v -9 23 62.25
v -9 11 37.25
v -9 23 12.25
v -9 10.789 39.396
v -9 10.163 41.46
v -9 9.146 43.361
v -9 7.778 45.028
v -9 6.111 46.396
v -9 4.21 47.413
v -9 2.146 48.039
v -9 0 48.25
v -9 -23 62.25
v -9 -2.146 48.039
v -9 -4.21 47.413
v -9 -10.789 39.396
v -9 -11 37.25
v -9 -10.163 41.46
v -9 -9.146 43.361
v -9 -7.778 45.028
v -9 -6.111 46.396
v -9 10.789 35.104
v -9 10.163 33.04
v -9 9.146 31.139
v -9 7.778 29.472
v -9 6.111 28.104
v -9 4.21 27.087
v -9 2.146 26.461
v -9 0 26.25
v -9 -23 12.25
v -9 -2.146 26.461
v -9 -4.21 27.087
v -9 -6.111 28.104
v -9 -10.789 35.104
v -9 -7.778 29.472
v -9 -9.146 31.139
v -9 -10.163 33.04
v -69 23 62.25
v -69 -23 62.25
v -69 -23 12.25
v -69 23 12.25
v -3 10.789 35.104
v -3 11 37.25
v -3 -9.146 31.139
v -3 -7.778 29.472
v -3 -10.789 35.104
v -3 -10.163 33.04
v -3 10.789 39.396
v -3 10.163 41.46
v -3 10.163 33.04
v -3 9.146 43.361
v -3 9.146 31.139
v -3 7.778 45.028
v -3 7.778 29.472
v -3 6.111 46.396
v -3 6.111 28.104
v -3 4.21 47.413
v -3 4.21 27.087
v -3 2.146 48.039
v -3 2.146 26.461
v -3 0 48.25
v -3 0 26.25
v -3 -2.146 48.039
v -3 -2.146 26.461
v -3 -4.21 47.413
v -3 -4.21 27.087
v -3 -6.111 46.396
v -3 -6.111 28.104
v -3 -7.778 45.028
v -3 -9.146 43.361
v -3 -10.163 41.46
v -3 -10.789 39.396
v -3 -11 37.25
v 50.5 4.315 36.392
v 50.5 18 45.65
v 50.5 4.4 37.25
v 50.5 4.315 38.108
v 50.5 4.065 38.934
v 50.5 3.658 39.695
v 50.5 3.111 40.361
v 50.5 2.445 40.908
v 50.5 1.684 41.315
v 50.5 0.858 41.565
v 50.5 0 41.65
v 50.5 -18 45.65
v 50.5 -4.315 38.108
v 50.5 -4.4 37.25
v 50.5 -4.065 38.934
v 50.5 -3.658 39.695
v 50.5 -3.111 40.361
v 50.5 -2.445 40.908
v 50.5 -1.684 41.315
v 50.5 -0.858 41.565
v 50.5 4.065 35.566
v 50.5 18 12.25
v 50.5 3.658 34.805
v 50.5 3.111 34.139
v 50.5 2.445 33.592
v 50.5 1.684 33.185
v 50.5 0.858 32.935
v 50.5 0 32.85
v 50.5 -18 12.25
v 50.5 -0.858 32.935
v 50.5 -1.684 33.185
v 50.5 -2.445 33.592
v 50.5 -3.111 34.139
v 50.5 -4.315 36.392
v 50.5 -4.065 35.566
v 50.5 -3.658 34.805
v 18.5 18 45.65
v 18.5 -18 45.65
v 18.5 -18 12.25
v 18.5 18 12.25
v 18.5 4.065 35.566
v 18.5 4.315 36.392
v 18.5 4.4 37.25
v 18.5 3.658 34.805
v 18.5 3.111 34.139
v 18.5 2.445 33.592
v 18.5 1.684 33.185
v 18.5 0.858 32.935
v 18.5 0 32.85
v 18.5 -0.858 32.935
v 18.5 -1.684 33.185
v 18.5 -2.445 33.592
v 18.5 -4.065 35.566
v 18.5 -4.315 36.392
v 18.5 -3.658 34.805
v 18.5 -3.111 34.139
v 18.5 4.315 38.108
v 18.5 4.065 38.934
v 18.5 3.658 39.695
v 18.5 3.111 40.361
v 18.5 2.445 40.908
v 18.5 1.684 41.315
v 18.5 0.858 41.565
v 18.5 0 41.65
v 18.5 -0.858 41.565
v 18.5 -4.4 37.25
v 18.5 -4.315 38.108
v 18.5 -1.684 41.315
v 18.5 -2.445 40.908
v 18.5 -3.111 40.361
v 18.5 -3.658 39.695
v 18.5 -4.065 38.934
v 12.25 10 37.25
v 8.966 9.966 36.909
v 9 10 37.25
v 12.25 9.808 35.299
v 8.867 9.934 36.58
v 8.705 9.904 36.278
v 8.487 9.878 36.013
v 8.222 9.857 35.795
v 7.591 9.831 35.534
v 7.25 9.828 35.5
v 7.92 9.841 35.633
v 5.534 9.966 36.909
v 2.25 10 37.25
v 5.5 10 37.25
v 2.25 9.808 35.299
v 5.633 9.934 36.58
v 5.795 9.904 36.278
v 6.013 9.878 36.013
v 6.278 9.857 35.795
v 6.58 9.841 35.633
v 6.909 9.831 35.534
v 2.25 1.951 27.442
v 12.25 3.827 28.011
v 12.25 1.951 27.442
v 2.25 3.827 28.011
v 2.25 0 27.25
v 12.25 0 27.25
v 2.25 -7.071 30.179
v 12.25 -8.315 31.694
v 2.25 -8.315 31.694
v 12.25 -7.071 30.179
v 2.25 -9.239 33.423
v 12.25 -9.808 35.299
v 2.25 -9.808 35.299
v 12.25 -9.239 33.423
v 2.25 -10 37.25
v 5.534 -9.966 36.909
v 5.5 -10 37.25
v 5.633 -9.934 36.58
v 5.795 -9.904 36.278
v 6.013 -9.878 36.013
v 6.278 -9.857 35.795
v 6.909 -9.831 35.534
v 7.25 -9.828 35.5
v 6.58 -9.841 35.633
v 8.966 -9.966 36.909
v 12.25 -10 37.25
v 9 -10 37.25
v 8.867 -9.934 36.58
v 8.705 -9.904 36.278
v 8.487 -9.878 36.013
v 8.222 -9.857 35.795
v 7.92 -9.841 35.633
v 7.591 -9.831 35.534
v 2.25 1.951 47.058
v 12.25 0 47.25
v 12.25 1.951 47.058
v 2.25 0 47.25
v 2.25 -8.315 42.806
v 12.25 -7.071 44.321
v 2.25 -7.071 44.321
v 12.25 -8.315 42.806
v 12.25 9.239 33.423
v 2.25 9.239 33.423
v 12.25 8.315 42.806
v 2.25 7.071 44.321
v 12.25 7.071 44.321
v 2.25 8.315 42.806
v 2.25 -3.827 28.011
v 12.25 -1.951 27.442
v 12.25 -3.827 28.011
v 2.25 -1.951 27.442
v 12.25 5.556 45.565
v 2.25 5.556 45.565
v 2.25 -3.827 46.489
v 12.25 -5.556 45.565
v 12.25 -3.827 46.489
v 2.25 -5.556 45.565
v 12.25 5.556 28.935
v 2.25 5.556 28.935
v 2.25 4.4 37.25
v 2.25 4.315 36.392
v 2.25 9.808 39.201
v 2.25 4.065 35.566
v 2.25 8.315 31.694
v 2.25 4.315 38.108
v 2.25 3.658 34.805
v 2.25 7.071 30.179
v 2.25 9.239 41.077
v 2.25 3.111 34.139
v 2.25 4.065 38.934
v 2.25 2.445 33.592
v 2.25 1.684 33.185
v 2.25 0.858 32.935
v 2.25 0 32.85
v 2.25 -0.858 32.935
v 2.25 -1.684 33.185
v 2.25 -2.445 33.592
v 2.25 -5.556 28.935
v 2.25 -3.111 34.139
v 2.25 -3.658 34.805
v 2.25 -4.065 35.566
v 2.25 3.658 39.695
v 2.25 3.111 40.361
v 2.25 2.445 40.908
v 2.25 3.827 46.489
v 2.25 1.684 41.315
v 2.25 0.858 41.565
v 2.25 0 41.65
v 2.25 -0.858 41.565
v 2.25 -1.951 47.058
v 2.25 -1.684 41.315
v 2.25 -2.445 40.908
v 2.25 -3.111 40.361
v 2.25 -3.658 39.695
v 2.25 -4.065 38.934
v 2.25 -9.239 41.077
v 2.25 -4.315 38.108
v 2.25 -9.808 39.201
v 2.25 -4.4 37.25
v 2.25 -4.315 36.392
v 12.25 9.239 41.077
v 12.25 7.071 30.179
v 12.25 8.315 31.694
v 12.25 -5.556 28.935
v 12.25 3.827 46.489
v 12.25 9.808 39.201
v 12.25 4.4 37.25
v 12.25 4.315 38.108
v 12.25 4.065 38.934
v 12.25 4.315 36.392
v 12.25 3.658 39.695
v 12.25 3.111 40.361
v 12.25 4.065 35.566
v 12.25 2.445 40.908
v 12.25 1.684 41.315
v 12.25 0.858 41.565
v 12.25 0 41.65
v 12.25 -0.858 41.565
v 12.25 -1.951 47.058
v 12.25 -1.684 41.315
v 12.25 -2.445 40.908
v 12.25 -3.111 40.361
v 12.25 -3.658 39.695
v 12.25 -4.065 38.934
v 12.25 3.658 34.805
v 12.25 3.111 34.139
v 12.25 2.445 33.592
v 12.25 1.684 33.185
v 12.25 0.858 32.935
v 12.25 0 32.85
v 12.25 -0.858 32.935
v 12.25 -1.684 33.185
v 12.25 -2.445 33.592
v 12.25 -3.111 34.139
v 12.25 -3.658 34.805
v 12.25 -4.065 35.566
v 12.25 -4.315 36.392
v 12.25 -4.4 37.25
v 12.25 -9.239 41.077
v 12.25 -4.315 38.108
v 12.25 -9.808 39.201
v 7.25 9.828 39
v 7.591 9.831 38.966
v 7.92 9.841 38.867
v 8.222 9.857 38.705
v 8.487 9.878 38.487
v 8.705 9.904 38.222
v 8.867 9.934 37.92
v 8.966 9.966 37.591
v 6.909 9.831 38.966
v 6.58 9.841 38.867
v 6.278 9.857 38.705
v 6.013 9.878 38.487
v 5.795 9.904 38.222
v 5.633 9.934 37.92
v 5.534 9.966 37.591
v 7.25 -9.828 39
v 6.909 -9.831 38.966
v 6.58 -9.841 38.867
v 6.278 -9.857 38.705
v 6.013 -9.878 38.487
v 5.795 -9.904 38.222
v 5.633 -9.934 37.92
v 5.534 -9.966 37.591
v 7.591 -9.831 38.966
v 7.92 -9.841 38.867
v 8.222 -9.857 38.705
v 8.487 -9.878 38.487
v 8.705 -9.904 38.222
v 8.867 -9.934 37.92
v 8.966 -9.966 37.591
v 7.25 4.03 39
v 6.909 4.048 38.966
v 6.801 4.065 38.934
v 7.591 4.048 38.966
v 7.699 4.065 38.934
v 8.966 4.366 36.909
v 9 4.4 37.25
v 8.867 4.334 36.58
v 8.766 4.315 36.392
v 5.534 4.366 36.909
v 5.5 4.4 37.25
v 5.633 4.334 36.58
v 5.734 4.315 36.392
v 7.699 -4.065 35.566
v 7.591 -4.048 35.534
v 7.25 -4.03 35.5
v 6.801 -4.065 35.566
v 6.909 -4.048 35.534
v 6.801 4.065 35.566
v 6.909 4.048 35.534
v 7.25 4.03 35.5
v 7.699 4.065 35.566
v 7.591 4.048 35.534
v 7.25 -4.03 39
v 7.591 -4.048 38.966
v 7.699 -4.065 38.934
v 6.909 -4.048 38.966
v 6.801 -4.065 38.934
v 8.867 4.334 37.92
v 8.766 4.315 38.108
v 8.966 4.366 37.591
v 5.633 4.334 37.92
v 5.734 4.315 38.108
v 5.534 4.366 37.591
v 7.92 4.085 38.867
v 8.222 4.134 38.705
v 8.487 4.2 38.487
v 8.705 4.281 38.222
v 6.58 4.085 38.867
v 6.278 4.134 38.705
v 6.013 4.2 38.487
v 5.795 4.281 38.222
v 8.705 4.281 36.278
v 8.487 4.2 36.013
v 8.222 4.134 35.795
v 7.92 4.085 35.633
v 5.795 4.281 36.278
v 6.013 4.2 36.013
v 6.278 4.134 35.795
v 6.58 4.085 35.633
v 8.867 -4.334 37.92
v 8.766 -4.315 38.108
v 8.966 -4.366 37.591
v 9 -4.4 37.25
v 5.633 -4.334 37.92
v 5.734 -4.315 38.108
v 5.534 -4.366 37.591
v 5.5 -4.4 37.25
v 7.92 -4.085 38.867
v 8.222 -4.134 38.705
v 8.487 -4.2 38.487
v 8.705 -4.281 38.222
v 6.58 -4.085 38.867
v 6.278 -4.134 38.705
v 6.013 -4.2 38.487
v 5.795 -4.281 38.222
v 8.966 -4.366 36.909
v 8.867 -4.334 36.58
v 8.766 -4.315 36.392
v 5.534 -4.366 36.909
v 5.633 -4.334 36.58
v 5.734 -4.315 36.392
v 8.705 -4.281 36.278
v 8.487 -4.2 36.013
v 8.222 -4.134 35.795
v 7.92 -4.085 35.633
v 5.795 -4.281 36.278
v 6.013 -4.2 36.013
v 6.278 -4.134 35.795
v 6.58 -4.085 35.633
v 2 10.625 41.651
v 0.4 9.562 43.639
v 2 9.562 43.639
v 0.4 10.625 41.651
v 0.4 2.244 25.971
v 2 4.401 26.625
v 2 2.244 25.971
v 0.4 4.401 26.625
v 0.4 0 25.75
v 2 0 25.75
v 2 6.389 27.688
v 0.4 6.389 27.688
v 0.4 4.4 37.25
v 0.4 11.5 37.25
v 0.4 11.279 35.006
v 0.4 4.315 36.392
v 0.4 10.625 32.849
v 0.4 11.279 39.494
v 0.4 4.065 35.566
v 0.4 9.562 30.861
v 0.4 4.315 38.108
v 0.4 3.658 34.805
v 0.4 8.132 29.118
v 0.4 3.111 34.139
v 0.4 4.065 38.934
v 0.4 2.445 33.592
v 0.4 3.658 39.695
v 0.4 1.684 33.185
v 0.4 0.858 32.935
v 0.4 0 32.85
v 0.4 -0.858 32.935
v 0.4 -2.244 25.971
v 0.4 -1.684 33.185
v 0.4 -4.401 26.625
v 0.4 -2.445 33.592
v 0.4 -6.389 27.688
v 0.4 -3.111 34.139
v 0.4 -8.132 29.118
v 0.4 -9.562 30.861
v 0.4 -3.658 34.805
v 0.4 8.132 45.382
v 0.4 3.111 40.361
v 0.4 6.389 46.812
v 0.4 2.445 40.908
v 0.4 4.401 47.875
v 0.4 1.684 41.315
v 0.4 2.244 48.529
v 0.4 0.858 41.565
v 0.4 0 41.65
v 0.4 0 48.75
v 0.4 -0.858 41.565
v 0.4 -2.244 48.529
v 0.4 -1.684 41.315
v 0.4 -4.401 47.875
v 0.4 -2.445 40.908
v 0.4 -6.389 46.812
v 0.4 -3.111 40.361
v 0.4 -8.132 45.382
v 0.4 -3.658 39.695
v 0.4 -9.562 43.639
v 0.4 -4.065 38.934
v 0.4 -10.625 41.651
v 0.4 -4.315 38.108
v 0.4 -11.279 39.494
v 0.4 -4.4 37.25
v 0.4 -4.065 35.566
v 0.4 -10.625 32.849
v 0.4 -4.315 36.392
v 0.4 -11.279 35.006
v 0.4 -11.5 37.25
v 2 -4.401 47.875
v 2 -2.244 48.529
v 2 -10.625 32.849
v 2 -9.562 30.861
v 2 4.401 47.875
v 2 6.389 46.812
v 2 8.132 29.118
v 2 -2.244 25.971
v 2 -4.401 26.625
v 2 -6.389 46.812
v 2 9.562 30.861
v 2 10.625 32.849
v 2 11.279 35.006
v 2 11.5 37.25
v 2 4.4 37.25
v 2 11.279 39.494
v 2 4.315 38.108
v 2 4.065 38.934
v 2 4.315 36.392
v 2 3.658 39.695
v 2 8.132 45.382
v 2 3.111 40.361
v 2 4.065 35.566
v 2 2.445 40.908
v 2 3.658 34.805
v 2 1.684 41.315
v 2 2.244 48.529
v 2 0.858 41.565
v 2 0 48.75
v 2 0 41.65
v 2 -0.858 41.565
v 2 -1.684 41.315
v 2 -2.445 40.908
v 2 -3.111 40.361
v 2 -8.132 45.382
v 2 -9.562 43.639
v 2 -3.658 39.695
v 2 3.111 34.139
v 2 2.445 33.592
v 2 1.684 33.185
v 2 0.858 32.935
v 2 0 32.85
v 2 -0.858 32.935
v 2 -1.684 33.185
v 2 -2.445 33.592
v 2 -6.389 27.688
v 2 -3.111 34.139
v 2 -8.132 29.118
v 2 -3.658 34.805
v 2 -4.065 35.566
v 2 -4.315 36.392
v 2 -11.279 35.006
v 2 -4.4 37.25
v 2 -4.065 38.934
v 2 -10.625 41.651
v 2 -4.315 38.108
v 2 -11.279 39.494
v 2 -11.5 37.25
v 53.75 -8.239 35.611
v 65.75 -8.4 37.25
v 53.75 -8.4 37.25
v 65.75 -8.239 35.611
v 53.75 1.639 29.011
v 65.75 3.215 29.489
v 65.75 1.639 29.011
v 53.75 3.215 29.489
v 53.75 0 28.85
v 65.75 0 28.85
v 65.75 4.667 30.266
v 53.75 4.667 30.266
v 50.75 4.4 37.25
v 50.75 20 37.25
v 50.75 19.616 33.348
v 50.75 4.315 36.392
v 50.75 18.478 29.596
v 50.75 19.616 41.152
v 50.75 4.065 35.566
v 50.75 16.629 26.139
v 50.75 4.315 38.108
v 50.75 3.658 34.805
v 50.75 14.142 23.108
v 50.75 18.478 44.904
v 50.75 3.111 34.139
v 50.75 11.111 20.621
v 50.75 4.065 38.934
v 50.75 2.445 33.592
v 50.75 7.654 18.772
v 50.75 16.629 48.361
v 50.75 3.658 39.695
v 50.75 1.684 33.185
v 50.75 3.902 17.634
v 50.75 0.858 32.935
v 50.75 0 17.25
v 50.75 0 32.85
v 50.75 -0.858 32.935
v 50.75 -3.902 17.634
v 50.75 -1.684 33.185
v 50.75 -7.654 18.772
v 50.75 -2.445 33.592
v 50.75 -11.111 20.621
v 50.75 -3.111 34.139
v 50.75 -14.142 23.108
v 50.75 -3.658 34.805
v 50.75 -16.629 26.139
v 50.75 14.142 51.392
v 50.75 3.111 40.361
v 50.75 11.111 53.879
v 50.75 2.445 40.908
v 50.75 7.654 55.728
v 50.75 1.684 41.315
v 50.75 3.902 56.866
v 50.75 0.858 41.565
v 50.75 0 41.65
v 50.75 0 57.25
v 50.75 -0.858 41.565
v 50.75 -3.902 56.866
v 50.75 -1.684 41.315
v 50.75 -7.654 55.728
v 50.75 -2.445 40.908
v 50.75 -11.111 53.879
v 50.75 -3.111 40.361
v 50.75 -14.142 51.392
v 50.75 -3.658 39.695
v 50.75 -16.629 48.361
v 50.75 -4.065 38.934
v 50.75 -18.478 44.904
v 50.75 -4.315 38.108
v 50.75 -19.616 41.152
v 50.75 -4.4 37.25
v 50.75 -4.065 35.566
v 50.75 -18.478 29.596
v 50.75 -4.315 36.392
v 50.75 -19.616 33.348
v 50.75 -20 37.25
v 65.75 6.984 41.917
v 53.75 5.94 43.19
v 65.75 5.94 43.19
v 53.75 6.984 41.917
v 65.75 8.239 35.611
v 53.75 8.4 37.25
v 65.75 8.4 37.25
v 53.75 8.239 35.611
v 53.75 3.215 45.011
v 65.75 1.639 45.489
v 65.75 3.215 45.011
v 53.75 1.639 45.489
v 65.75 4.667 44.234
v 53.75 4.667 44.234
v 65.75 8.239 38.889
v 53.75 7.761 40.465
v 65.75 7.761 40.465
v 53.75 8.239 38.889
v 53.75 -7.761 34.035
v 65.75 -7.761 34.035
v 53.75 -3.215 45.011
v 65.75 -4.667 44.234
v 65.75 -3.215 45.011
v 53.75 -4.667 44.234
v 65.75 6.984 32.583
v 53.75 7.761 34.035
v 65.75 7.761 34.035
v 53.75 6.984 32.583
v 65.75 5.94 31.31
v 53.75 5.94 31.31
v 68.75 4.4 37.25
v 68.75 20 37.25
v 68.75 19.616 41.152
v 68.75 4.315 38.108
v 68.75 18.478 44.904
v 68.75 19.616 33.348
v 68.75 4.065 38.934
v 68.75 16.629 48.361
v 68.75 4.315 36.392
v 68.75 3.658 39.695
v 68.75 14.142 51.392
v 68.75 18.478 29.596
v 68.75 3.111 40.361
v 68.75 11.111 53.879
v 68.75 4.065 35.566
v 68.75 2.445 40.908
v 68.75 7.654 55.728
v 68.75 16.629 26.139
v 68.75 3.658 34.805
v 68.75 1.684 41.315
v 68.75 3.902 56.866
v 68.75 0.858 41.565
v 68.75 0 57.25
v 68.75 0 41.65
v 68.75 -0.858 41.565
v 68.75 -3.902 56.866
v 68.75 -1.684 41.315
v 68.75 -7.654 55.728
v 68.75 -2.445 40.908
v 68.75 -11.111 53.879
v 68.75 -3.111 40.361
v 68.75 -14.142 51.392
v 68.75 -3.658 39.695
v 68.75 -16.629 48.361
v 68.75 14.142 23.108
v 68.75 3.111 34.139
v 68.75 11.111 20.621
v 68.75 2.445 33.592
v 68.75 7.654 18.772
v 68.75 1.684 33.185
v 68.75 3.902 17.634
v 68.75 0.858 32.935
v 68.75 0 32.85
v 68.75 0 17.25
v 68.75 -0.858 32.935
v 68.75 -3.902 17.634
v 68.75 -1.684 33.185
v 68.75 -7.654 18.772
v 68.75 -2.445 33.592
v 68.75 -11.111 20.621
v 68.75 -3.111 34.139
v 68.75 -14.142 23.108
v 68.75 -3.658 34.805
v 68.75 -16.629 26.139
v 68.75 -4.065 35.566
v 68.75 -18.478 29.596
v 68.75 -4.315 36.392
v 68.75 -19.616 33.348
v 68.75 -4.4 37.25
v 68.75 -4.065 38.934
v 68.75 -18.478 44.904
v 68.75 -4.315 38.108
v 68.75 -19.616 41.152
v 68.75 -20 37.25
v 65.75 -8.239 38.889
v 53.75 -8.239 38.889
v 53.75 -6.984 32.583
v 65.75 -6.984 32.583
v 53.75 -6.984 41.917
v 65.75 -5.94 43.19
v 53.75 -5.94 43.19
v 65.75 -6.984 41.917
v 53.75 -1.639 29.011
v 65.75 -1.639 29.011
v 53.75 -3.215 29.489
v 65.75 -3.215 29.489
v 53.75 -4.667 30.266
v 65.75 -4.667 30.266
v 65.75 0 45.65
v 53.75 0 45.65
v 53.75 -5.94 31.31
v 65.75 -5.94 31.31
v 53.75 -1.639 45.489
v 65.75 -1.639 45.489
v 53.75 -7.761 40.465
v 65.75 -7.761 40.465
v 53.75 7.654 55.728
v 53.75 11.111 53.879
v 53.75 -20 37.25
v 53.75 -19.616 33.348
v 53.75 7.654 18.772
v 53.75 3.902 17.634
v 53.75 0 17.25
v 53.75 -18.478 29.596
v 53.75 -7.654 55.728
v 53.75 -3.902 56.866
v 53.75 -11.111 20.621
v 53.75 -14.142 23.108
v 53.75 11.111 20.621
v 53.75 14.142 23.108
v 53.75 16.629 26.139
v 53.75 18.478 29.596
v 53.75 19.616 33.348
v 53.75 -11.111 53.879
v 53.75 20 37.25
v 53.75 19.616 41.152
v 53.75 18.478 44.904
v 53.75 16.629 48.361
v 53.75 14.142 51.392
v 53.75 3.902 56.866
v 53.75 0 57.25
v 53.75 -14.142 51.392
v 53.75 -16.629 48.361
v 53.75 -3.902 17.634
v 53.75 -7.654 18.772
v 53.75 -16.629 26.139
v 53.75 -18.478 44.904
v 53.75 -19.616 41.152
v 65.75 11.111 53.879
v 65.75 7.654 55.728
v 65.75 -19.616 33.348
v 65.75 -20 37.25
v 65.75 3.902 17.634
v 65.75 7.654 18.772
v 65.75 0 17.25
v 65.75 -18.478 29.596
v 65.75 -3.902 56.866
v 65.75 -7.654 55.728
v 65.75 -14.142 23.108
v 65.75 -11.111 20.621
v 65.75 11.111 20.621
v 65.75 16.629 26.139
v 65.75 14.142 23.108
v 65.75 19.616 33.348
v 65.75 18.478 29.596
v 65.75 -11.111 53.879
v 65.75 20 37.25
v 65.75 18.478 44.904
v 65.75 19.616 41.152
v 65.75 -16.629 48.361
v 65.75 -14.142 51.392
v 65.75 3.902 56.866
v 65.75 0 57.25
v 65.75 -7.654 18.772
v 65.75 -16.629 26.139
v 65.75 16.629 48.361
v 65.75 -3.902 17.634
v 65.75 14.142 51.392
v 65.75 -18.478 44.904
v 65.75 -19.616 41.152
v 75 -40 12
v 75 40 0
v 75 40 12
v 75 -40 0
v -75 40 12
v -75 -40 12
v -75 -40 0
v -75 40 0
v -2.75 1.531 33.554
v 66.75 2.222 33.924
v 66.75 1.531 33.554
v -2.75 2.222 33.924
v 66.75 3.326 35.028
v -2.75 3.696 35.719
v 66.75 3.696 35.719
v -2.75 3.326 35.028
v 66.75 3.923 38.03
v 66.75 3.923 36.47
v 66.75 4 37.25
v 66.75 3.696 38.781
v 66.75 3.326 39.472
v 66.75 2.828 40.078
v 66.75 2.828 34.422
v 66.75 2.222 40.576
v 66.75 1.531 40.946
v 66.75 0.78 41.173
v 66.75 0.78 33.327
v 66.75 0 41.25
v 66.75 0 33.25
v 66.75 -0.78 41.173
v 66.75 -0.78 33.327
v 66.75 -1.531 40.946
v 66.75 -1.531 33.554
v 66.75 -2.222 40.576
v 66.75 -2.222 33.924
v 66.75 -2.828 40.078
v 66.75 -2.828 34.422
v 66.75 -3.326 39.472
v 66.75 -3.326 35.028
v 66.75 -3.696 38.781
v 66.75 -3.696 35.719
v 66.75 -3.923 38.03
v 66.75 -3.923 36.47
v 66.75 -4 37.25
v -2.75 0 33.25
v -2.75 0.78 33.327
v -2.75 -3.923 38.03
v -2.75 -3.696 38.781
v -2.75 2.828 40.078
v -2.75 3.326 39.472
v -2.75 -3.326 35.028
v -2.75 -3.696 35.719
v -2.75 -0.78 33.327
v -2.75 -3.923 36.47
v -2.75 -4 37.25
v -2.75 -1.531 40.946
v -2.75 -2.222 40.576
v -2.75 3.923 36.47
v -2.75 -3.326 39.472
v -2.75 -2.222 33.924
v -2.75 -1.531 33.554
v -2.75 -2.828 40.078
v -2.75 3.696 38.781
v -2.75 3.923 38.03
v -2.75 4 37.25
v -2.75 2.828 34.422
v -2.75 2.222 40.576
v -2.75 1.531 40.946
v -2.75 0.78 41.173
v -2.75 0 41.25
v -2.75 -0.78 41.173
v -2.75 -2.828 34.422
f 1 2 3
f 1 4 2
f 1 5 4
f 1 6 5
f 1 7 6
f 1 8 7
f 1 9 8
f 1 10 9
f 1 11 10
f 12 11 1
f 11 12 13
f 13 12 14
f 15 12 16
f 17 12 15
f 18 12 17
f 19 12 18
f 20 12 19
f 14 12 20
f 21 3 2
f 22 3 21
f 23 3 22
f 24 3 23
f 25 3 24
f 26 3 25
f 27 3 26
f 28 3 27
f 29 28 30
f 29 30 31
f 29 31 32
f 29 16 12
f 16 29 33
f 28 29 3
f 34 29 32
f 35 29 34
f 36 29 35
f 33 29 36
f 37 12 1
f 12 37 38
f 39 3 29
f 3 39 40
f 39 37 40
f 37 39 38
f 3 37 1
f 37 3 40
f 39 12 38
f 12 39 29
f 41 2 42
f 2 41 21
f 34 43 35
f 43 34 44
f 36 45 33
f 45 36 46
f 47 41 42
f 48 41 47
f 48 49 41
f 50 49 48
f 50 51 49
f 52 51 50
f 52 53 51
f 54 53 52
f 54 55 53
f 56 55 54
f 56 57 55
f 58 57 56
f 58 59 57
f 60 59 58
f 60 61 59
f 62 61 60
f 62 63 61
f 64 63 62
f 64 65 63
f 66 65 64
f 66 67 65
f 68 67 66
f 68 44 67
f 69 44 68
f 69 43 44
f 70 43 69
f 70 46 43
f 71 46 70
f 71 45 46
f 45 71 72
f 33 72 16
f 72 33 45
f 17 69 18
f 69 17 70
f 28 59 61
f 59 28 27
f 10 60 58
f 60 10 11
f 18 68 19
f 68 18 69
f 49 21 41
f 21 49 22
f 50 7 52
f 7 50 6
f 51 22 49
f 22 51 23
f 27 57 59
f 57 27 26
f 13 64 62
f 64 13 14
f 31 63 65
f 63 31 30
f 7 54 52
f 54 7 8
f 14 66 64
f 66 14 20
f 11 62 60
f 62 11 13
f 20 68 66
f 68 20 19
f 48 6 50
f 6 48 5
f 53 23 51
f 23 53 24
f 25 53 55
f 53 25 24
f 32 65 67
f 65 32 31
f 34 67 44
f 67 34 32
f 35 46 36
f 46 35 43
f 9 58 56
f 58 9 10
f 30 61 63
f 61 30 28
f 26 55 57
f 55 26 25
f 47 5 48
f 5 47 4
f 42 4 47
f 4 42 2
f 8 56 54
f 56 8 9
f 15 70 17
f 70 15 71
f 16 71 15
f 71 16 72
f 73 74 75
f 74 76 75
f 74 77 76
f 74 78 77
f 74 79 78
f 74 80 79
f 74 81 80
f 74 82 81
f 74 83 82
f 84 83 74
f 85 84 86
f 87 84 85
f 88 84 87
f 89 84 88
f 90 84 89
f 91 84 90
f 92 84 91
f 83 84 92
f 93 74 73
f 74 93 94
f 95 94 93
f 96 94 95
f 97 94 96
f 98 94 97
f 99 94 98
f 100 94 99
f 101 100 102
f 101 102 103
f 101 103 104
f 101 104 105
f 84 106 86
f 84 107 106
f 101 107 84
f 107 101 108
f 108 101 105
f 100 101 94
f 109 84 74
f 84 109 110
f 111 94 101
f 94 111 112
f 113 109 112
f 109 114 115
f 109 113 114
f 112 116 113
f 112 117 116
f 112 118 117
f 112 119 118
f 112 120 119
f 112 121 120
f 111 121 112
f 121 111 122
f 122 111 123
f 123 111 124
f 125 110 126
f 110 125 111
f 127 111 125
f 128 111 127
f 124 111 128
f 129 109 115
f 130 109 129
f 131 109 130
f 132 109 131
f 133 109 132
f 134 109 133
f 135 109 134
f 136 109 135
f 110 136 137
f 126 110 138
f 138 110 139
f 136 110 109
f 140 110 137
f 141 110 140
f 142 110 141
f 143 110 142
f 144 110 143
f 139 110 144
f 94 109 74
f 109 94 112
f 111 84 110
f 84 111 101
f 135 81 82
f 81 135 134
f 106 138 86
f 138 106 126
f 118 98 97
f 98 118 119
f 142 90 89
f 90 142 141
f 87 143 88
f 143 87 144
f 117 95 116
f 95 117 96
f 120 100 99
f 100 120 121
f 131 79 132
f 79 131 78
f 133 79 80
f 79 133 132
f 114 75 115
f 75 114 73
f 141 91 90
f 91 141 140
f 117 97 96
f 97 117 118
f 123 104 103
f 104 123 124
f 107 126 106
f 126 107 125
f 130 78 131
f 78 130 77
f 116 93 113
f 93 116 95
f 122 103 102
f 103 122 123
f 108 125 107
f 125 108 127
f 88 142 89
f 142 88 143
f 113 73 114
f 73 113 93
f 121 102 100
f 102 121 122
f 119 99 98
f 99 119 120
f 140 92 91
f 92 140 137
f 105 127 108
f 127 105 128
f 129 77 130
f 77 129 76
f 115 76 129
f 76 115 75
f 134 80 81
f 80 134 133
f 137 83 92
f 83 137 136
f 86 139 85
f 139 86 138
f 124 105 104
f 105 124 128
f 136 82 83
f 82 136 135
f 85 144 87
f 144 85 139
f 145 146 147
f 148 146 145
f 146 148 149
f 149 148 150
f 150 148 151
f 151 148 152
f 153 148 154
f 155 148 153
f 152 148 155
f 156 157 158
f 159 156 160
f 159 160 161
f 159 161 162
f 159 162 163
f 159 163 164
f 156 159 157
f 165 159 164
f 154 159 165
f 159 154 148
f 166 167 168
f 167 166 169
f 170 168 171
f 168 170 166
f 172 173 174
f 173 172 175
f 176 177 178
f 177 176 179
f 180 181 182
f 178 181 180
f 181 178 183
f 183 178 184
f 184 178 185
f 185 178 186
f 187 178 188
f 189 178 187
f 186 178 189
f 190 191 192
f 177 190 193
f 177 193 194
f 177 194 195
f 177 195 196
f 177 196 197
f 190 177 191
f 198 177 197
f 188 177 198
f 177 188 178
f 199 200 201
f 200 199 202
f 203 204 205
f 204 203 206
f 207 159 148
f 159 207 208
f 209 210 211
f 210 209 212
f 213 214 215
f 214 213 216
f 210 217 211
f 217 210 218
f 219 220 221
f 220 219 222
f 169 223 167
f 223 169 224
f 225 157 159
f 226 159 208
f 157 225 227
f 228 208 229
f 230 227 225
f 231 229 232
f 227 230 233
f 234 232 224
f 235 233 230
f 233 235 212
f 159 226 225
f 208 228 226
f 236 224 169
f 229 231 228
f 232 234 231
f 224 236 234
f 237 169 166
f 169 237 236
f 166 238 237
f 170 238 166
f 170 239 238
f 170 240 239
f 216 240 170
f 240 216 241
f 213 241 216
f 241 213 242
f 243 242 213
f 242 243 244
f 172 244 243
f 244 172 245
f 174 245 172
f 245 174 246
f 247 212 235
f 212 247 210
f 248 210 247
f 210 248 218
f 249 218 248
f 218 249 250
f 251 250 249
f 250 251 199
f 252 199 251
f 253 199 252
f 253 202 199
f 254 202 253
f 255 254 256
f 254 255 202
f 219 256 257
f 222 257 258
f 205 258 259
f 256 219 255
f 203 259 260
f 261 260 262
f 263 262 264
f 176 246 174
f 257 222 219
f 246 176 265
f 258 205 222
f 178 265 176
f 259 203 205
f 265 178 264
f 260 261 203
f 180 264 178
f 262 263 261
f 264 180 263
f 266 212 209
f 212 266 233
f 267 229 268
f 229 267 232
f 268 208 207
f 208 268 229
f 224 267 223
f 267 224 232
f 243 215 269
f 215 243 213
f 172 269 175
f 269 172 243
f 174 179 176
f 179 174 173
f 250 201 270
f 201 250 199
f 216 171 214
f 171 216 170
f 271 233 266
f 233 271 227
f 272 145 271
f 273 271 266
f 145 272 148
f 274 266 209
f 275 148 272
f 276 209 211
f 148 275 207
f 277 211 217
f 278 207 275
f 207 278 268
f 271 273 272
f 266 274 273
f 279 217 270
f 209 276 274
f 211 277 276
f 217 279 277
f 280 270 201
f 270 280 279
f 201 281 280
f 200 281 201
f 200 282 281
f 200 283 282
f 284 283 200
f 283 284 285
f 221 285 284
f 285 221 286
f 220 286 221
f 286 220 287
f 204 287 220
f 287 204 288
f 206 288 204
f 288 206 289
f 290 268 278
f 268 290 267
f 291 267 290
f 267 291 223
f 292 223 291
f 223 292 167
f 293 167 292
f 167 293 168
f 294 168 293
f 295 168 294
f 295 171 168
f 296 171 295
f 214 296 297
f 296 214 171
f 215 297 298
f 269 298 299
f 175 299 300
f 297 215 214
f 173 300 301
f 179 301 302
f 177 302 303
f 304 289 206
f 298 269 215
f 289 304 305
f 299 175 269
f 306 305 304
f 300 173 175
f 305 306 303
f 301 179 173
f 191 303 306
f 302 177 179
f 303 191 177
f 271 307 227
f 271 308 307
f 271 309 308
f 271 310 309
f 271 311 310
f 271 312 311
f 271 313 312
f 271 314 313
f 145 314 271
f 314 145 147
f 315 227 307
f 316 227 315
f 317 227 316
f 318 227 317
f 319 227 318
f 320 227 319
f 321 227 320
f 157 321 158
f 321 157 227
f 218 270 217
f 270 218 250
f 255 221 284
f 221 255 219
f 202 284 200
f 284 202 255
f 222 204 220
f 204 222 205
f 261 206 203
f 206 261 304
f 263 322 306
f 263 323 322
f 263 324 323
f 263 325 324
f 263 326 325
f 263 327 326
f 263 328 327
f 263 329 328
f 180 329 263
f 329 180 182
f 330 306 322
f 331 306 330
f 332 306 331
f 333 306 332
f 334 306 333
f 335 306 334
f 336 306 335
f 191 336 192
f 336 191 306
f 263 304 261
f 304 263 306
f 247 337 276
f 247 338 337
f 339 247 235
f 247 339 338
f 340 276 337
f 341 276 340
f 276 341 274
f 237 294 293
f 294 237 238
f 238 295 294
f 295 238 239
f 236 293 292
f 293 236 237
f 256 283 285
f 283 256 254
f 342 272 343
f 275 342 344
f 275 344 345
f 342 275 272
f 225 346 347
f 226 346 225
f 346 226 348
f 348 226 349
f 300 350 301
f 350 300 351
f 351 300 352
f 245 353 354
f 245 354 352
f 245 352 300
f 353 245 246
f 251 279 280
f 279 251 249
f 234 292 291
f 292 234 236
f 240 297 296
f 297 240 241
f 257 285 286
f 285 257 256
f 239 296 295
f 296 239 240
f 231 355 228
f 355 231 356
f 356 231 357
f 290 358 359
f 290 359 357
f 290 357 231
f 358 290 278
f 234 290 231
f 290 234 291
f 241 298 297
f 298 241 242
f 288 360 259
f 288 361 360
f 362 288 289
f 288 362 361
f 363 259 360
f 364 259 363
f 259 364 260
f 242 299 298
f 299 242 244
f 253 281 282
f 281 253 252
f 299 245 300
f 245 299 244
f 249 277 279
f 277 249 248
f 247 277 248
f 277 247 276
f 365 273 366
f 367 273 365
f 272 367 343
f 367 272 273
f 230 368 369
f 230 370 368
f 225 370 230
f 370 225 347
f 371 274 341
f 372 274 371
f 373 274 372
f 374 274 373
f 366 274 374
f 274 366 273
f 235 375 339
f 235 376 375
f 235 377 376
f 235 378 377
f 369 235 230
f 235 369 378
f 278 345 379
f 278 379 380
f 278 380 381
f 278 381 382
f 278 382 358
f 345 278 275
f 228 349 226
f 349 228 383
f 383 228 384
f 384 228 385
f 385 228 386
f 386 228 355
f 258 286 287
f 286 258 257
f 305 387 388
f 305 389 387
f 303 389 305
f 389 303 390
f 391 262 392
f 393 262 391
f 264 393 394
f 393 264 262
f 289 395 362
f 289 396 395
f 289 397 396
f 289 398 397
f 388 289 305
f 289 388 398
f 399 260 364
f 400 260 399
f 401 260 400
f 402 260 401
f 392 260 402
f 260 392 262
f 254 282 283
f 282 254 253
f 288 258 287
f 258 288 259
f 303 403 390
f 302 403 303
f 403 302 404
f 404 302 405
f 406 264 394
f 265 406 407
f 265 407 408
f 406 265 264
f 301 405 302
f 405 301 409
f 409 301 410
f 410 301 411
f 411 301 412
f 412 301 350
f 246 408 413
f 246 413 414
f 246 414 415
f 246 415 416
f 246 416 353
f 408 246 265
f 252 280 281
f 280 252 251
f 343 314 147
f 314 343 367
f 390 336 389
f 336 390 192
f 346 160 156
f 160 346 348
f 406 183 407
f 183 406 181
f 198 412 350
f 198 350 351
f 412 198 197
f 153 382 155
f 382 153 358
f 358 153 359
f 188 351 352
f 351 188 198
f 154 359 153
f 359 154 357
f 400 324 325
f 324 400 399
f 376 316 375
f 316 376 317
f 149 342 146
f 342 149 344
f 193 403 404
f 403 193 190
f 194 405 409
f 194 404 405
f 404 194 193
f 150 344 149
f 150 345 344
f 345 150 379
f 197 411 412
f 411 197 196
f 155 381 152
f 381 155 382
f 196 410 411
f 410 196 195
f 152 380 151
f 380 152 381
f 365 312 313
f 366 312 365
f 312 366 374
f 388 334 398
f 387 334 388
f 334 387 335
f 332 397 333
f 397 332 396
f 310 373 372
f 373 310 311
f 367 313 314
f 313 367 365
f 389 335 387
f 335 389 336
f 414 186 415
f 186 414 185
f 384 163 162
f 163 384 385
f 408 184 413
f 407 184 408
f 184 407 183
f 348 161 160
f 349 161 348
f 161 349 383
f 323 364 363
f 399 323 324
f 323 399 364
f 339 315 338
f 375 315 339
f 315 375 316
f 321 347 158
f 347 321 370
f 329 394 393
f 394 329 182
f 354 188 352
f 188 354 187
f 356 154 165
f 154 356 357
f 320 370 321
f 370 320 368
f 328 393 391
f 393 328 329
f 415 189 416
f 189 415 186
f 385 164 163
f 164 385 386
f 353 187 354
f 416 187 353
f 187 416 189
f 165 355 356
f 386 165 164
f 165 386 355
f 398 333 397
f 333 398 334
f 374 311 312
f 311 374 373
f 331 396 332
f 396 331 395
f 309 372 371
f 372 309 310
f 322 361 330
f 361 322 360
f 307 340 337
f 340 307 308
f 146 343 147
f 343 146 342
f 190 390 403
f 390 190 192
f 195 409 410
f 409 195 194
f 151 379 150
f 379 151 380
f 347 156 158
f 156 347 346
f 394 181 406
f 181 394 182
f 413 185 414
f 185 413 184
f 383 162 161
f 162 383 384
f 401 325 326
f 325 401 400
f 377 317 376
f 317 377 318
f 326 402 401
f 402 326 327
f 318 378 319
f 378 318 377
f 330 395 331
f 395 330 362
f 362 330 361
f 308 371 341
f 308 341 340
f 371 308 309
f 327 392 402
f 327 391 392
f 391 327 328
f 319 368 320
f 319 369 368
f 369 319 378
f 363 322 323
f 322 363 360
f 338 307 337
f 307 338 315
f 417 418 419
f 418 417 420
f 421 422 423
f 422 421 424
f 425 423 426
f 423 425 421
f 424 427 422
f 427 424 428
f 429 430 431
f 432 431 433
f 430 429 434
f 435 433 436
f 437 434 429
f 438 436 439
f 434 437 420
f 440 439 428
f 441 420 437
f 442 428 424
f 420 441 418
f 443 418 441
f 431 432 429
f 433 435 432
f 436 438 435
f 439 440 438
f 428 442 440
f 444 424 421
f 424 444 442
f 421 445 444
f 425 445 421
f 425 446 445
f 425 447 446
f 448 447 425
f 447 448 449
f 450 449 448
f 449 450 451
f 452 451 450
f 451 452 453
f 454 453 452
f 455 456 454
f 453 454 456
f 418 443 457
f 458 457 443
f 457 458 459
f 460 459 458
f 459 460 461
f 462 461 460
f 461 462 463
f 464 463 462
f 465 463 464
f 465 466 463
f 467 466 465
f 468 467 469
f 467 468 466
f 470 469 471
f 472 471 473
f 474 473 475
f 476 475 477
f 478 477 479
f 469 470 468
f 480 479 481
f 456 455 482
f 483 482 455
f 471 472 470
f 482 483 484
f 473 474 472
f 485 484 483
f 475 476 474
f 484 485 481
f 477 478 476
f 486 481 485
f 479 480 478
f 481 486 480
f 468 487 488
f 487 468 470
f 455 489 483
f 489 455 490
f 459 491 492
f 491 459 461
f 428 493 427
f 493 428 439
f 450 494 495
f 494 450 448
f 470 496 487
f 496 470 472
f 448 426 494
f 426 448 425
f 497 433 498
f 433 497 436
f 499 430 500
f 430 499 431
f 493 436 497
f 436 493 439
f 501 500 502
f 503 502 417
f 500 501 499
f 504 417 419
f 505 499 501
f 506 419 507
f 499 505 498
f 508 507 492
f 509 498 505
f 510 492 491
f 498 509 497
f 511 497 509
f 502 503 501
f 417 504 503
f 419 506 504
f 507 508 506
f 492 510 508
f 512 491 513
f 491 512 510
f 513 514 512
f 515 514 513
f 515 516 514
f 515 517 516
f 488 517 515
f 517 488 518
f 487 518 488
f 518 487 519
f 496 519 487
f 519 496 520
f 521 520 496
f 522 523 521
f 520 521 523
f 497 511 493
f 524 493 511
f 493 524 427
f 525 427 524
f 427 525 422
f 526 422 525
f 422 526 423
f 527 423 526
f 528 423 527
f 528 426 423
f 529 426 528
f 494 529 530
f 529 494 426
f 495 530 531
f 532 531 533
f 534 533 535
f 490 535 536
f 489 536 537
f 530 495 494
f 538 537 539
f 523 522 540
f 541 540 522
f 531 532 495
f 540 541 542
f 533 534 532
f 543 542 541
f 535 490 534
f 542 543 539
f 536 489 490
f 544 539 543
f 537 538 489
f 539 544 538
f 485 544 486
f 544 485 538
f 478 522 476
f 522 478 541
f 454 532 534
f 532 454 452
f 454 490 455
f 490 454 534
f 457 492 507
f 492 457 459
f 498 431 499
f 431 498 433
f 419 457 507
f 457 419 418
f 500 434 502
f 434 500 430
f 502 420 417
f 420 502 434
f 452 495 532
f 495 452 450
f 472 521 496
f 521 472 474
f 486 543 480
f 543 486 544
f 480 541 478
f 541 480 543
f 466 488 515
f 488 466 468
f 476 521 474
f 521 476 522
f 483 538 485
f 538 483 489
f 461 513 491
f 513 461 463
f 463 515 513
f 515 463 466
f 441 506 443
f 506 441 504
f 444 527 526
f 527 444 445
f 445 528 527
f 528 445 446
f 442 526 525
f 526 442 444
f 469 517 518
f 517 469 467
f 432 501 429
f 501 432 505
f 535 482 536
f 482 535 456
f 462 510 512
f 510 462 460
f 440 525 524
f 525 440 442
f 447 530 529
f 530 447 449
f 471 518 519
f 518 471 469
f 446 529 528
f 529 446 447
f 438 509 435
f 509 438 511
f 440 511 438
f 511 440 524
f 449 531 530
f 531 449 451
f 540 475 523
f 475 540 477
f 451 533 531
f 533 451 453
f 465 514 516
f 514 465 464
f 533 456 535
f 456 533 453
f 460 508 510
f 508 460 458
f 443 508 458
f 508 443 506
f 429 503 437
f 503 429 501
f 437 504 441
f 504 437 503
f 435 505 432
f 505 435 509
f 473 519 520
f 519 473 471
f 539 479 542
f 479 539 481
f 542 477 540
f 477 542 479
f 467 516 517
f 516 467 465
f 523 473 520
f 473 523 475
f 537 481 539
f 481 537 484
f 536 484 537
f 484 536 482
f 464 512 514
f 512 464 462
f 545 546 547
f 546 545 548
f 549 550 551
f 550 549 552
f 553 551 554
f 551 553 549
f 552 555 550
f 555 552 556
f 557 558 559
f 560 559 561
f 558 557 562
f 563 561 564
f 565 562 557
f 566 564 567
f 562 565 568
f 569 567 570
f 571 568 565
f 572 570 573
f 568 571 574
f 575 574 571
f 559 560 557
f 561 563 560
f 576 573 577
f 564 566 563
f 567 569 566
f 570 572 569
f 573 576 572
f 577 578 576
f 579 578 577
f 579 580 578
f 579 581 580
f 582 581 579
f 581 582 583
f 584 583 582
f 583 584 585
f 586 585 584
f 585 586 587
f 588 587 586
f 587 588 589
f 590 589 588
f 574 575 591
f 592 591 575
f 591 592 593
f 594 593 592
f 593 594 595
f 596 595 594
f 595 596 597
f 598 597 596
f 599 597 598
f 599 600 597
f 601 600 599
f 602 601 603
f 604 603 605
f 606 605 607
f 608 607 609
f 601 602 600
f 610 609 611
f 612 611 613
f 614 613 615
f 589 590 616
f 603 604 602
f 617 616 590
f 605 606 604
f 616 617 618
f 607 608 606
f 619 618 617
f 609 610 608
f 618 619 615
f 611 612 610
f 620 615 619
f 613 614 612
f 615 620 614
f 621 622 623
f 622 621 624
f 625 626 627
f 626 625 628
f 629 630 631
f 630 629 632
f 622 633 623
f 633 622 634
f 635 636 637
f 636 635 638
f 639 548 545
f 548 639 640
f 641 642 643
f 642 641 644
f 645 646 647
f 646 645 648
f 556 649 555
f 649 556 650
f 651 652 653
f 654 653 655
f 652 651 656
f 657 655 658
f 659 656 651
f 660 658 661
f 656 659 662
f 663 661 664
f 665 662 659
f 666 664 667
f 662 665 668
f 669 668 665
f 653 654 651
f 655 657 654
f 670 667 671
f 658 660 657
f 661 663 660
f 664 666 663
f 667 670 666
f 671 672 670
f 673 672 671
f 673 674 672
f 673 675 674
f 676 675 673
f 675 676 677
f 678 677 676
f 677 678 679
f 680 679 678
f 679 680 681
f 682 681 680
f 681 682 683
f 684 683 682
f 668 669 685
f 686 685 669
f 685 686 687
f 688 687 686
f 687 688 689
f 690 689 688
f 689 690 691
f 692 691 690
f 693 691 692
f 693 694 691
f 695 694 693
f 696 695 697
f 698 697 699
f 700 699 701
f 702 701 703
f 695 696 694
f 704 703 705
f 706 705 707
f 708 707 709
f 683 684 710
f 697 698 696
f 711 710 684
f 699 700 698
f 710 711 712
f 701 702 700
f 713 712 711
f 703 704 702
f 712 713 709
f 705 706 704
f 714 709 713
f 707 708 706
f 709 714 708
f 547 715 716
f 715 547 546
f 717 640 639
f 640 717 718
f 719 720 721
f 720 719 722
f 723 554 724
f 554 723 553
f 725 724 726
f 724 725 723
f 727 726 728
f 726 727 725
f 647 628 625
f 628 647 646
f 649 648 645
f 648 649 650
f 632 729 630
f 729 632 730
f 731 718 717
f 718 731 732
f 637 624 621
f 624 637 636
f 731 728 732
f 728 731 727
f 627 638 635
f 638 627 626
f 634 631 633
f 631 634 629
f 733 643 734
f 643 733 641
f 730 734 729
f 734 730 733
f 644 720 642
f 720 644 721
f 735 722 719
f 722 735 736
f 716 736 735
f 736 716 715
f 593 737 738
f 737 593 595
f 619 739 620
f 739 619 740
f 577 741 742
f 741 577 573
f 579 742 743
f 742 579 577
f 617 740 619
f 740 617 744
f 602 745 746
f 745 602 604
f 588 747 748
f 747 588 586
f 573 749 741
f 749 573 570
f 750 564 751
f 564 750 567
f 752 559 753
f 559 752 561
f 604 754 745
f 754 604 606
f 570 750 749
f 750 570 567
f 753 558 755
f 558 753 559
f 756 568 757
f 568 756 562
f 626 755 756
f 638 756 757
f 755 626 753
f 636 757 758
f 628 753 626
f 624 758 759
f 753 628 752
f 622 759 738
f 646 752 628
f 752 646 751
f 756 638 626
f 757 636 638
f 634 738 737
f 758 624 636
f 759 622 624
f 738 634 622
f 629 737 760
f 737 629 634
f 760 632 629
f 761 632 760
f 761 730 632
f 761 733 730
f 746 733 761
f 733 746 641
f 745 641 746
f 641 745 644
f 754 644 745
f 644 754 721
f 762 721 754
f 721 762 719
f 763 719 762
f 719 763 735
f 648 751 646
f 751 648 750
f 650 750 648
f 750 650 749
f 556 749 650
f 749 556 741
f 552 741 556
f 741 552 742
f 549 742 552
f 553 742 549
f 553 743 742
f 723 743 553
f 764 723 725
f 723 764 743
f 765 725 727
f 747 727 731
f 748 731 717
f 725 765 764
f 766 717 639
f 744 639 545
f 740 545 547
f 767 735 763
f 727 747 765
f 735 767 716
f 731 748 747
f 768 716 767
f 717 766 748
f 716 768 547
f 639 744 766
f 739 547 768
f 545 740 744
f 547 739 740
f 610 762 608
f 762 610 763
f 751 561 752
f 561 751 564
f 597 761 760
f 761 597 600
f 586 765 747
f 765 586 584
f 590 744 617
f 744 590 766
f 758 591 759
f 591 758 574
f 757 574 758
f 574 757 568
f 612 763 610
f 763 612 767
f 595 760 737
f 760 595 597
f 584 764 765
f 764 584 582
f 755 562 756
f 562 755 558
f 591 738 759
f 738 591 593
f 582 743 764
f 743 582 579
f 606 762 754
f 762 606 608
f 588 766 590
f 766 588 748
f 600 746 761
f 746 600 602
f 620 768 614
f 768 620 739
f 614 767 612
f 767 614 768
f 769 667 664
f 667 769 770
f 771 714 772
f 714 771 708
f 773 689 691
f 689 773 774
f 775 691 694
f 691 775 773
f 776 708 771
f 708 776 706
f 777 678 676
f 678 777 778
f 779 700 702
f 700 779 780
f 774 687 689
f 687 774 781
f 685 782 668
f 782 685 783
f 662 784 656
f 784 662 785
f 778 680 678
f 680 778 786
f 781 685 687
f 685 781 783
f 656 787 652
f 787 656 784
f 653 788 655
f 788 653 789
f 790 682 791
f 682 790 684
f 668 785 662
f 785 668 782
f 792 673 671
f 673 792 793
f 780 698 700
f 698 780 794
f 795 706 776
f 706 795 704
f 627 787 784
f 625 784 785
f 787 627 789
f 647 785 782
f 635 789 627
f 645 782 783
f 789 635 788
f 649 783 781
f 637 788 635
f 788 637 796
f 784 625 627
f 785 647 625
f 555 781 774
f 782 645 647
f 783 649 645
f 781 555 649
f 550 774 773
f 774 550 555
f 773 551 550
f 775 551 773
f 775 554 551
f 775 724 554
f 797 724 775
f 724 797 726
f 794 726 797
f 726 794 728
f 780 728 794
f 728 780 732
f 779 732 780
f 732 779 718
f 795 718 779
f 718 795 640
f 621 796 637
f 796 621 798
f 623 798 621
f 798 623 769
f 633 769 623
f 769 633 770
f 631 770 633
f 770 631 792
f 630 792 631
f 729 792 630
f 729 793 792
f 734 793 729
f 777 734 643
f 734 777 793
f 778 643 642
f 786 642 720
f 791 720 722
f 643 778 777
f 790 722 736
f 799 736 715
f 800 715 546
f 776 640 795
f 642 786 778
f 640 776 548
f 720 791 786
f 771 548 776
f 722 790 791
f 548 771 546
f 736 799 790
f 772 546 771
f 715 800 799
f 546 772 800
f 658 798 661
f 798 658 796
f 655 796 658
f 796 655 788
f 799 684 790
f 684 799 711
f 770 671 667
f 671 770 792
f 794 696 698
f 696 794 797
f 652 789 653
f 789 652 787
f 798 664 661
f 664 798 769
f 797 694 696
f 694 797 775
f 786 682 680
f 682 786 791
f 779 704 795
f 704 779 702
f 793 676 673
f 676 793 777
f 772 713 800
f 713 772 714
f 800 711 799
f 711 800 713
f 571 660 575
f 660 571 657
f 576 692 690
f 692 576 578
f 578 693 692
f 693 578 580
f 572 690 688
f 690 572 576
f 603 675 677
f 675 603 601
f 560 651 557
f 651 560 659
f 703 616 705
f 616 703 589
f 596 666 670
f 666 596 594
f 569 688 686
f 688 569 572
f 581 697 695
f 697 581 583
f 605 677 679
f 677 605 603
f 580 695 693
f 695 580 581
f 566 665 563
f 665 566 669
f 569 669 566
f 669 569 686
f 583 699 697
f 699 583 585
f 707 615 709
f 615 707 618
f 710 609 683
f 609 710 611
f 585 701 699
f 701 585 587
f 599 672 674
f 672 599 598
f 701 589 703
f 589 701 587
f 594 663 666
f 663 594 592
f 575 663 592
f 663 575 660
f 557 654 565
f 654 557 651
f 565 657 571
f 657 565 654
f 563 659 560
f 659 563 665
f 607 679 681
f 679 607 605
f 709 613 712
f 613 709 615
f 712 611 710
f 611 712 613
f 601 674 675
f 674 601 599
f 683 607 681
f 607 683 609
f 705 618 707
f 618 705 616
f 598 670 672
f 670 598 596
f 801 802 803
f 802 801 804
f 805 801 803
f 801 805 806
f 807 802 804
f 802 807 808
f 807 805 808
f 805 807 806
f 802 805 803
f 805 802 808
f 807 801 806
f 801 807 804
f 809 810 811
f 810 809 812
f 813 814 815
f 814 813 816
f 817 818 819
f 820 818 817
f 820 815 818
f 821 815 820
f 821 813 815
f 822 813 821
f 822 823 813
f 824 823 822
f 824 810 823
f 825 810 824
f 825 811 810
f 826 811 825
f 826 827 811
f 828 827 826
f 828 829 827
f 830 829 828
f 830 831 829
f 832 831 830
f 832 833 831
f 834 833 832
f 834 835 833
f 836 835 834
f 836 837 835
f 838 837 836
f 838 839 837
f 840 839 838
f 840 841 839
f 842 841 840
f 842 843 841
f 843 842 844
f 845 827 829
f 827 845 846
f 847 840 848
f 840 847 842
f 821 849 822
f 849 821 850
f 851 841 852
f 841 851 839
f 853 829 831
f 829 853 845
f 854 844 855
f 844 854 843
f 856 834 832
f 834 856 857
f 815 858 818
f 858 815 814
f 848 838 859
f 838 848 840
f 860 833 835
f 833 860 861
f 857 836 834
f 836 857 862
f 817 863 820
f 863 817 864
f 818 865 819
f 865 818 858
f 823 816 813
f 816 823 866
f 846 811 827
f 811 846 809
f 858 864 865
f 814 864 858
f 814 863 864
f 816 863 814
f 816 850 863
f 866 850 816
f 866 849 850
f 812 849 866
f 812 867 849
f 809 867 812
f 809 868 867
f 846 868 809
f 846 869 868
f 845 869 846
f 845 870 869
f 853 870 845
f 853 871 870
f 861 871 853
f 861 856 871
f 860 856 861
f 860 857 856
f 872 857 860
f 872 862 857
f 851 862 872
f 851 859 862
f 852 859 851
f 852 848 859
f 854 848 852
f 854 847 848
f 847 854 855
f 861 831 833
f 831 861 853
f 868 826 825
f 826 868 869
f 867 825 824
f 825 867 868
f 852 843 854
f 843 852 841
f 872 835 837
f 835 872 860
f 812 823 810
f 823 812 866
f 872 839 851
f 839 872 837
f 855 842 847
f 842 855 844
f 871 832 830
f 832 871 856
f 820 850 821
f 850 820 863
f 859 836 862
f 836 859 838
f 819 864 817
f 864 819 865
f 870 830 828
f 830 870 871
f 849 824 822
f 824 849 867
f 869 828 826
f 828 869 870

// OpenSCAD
$fn = 32;

// ------------------------------------------------------------------------
// Motor drive station: motor 60 x 50 mm, shaft d8, pulley d40
// Every part is its own module, assembly() places every instance.
// ------------------------------------------------------------------------

// --- part 1 ---
module station_bed() {
  difference() {
    translate([-75, -40, 0]) cube([150, 80, 12]);
  }
}

// --- part 2 ---
module drive_motor() {
  union() {
    translate([-30, -23, 0]) cube([60, 46, 50]);
    translate([33, 0, 25]) rotate([0, 90, 0]) cylinder(h = 6, d = 22, center = true);
  }
}

// --- part 3 ---
module pillow_block() {
  difference() {
    translate([-16, -18, 0]) cube([32, 36, 33.4]);
    translate([0, 0, 25]) rotate([0, 90, 0]) cylinder(h = 34, d = 8.8, center = true);
  }
}

// --- part 4 ---
module drive_shaft() {
  translate([0, 0, -34.75]) cylinder(h = 69.5, d = 8);
}

// --- part 5 ---
module shaft_collar() {
  difference() {
    cylinder(h = 10, d = 20);
    translate([0, 0, -1]) cylinder(h = 12, d = 8.8);
    translate([0, 0, 5]) rotate([90, 0, 0]) cylinder(h = 22, d = 3.5, center = true);
  }
}

// --- part 6 ---
module collar_washer() {
  difference() {
      translate([0, 0, 0]) cylinder(h = 1.6, d = 23);
      translate([0, 0, -1]) cylinder(h = 3.6, d = 8.8);
    }
}

// --- part 7 ---
module drive_pulley() {
  difference() {
    union() {
      cylinder(h = 18, d = 16.8);
      cylinder(h = 3, d = 40);
      translate([0, 0, 15]) cylinder(h = 3, d = 40);
    }
    translate([0, 0, -1]) cylinder(h = 20, d = 8.8);
  }
}

// --- assembly ---
module assembly() {
  color([0.80, 0.24, 0.20]) translate([0, 0, 0]) rotate([0, 0, 0]) station_bed();
  color([0.20, 0.45, 0.75]) translate([-39, 0, 12.25]) rotate([0, 0, 0]) drive_motor();
  color([0.25, 0.62, 0.32]) translate([34.5, 0, 12.25]) rotate([0, 0, 0]) pillow_block();
  color([0.92, 0.70, 0.18]) translate([32, 0, 37.25]) rotate([0, 90, 0]) drive_shaft();
  color([0.58, 0.35, 0.70]) translate([2.25, 0, 37.25]) rotate([0, 90, 0]) shaft_collar();
  color([0.16, 0.66, 0.66]) translate([0.4, 0, 37.25]) rotate([0, 90, 0]) collar_washer();
  color([0.85, 0.48, 0.18]) translate([50.75, 0, 37.25]) rotate([0, 90, 0]) drive_pulley();
}

assembly();
